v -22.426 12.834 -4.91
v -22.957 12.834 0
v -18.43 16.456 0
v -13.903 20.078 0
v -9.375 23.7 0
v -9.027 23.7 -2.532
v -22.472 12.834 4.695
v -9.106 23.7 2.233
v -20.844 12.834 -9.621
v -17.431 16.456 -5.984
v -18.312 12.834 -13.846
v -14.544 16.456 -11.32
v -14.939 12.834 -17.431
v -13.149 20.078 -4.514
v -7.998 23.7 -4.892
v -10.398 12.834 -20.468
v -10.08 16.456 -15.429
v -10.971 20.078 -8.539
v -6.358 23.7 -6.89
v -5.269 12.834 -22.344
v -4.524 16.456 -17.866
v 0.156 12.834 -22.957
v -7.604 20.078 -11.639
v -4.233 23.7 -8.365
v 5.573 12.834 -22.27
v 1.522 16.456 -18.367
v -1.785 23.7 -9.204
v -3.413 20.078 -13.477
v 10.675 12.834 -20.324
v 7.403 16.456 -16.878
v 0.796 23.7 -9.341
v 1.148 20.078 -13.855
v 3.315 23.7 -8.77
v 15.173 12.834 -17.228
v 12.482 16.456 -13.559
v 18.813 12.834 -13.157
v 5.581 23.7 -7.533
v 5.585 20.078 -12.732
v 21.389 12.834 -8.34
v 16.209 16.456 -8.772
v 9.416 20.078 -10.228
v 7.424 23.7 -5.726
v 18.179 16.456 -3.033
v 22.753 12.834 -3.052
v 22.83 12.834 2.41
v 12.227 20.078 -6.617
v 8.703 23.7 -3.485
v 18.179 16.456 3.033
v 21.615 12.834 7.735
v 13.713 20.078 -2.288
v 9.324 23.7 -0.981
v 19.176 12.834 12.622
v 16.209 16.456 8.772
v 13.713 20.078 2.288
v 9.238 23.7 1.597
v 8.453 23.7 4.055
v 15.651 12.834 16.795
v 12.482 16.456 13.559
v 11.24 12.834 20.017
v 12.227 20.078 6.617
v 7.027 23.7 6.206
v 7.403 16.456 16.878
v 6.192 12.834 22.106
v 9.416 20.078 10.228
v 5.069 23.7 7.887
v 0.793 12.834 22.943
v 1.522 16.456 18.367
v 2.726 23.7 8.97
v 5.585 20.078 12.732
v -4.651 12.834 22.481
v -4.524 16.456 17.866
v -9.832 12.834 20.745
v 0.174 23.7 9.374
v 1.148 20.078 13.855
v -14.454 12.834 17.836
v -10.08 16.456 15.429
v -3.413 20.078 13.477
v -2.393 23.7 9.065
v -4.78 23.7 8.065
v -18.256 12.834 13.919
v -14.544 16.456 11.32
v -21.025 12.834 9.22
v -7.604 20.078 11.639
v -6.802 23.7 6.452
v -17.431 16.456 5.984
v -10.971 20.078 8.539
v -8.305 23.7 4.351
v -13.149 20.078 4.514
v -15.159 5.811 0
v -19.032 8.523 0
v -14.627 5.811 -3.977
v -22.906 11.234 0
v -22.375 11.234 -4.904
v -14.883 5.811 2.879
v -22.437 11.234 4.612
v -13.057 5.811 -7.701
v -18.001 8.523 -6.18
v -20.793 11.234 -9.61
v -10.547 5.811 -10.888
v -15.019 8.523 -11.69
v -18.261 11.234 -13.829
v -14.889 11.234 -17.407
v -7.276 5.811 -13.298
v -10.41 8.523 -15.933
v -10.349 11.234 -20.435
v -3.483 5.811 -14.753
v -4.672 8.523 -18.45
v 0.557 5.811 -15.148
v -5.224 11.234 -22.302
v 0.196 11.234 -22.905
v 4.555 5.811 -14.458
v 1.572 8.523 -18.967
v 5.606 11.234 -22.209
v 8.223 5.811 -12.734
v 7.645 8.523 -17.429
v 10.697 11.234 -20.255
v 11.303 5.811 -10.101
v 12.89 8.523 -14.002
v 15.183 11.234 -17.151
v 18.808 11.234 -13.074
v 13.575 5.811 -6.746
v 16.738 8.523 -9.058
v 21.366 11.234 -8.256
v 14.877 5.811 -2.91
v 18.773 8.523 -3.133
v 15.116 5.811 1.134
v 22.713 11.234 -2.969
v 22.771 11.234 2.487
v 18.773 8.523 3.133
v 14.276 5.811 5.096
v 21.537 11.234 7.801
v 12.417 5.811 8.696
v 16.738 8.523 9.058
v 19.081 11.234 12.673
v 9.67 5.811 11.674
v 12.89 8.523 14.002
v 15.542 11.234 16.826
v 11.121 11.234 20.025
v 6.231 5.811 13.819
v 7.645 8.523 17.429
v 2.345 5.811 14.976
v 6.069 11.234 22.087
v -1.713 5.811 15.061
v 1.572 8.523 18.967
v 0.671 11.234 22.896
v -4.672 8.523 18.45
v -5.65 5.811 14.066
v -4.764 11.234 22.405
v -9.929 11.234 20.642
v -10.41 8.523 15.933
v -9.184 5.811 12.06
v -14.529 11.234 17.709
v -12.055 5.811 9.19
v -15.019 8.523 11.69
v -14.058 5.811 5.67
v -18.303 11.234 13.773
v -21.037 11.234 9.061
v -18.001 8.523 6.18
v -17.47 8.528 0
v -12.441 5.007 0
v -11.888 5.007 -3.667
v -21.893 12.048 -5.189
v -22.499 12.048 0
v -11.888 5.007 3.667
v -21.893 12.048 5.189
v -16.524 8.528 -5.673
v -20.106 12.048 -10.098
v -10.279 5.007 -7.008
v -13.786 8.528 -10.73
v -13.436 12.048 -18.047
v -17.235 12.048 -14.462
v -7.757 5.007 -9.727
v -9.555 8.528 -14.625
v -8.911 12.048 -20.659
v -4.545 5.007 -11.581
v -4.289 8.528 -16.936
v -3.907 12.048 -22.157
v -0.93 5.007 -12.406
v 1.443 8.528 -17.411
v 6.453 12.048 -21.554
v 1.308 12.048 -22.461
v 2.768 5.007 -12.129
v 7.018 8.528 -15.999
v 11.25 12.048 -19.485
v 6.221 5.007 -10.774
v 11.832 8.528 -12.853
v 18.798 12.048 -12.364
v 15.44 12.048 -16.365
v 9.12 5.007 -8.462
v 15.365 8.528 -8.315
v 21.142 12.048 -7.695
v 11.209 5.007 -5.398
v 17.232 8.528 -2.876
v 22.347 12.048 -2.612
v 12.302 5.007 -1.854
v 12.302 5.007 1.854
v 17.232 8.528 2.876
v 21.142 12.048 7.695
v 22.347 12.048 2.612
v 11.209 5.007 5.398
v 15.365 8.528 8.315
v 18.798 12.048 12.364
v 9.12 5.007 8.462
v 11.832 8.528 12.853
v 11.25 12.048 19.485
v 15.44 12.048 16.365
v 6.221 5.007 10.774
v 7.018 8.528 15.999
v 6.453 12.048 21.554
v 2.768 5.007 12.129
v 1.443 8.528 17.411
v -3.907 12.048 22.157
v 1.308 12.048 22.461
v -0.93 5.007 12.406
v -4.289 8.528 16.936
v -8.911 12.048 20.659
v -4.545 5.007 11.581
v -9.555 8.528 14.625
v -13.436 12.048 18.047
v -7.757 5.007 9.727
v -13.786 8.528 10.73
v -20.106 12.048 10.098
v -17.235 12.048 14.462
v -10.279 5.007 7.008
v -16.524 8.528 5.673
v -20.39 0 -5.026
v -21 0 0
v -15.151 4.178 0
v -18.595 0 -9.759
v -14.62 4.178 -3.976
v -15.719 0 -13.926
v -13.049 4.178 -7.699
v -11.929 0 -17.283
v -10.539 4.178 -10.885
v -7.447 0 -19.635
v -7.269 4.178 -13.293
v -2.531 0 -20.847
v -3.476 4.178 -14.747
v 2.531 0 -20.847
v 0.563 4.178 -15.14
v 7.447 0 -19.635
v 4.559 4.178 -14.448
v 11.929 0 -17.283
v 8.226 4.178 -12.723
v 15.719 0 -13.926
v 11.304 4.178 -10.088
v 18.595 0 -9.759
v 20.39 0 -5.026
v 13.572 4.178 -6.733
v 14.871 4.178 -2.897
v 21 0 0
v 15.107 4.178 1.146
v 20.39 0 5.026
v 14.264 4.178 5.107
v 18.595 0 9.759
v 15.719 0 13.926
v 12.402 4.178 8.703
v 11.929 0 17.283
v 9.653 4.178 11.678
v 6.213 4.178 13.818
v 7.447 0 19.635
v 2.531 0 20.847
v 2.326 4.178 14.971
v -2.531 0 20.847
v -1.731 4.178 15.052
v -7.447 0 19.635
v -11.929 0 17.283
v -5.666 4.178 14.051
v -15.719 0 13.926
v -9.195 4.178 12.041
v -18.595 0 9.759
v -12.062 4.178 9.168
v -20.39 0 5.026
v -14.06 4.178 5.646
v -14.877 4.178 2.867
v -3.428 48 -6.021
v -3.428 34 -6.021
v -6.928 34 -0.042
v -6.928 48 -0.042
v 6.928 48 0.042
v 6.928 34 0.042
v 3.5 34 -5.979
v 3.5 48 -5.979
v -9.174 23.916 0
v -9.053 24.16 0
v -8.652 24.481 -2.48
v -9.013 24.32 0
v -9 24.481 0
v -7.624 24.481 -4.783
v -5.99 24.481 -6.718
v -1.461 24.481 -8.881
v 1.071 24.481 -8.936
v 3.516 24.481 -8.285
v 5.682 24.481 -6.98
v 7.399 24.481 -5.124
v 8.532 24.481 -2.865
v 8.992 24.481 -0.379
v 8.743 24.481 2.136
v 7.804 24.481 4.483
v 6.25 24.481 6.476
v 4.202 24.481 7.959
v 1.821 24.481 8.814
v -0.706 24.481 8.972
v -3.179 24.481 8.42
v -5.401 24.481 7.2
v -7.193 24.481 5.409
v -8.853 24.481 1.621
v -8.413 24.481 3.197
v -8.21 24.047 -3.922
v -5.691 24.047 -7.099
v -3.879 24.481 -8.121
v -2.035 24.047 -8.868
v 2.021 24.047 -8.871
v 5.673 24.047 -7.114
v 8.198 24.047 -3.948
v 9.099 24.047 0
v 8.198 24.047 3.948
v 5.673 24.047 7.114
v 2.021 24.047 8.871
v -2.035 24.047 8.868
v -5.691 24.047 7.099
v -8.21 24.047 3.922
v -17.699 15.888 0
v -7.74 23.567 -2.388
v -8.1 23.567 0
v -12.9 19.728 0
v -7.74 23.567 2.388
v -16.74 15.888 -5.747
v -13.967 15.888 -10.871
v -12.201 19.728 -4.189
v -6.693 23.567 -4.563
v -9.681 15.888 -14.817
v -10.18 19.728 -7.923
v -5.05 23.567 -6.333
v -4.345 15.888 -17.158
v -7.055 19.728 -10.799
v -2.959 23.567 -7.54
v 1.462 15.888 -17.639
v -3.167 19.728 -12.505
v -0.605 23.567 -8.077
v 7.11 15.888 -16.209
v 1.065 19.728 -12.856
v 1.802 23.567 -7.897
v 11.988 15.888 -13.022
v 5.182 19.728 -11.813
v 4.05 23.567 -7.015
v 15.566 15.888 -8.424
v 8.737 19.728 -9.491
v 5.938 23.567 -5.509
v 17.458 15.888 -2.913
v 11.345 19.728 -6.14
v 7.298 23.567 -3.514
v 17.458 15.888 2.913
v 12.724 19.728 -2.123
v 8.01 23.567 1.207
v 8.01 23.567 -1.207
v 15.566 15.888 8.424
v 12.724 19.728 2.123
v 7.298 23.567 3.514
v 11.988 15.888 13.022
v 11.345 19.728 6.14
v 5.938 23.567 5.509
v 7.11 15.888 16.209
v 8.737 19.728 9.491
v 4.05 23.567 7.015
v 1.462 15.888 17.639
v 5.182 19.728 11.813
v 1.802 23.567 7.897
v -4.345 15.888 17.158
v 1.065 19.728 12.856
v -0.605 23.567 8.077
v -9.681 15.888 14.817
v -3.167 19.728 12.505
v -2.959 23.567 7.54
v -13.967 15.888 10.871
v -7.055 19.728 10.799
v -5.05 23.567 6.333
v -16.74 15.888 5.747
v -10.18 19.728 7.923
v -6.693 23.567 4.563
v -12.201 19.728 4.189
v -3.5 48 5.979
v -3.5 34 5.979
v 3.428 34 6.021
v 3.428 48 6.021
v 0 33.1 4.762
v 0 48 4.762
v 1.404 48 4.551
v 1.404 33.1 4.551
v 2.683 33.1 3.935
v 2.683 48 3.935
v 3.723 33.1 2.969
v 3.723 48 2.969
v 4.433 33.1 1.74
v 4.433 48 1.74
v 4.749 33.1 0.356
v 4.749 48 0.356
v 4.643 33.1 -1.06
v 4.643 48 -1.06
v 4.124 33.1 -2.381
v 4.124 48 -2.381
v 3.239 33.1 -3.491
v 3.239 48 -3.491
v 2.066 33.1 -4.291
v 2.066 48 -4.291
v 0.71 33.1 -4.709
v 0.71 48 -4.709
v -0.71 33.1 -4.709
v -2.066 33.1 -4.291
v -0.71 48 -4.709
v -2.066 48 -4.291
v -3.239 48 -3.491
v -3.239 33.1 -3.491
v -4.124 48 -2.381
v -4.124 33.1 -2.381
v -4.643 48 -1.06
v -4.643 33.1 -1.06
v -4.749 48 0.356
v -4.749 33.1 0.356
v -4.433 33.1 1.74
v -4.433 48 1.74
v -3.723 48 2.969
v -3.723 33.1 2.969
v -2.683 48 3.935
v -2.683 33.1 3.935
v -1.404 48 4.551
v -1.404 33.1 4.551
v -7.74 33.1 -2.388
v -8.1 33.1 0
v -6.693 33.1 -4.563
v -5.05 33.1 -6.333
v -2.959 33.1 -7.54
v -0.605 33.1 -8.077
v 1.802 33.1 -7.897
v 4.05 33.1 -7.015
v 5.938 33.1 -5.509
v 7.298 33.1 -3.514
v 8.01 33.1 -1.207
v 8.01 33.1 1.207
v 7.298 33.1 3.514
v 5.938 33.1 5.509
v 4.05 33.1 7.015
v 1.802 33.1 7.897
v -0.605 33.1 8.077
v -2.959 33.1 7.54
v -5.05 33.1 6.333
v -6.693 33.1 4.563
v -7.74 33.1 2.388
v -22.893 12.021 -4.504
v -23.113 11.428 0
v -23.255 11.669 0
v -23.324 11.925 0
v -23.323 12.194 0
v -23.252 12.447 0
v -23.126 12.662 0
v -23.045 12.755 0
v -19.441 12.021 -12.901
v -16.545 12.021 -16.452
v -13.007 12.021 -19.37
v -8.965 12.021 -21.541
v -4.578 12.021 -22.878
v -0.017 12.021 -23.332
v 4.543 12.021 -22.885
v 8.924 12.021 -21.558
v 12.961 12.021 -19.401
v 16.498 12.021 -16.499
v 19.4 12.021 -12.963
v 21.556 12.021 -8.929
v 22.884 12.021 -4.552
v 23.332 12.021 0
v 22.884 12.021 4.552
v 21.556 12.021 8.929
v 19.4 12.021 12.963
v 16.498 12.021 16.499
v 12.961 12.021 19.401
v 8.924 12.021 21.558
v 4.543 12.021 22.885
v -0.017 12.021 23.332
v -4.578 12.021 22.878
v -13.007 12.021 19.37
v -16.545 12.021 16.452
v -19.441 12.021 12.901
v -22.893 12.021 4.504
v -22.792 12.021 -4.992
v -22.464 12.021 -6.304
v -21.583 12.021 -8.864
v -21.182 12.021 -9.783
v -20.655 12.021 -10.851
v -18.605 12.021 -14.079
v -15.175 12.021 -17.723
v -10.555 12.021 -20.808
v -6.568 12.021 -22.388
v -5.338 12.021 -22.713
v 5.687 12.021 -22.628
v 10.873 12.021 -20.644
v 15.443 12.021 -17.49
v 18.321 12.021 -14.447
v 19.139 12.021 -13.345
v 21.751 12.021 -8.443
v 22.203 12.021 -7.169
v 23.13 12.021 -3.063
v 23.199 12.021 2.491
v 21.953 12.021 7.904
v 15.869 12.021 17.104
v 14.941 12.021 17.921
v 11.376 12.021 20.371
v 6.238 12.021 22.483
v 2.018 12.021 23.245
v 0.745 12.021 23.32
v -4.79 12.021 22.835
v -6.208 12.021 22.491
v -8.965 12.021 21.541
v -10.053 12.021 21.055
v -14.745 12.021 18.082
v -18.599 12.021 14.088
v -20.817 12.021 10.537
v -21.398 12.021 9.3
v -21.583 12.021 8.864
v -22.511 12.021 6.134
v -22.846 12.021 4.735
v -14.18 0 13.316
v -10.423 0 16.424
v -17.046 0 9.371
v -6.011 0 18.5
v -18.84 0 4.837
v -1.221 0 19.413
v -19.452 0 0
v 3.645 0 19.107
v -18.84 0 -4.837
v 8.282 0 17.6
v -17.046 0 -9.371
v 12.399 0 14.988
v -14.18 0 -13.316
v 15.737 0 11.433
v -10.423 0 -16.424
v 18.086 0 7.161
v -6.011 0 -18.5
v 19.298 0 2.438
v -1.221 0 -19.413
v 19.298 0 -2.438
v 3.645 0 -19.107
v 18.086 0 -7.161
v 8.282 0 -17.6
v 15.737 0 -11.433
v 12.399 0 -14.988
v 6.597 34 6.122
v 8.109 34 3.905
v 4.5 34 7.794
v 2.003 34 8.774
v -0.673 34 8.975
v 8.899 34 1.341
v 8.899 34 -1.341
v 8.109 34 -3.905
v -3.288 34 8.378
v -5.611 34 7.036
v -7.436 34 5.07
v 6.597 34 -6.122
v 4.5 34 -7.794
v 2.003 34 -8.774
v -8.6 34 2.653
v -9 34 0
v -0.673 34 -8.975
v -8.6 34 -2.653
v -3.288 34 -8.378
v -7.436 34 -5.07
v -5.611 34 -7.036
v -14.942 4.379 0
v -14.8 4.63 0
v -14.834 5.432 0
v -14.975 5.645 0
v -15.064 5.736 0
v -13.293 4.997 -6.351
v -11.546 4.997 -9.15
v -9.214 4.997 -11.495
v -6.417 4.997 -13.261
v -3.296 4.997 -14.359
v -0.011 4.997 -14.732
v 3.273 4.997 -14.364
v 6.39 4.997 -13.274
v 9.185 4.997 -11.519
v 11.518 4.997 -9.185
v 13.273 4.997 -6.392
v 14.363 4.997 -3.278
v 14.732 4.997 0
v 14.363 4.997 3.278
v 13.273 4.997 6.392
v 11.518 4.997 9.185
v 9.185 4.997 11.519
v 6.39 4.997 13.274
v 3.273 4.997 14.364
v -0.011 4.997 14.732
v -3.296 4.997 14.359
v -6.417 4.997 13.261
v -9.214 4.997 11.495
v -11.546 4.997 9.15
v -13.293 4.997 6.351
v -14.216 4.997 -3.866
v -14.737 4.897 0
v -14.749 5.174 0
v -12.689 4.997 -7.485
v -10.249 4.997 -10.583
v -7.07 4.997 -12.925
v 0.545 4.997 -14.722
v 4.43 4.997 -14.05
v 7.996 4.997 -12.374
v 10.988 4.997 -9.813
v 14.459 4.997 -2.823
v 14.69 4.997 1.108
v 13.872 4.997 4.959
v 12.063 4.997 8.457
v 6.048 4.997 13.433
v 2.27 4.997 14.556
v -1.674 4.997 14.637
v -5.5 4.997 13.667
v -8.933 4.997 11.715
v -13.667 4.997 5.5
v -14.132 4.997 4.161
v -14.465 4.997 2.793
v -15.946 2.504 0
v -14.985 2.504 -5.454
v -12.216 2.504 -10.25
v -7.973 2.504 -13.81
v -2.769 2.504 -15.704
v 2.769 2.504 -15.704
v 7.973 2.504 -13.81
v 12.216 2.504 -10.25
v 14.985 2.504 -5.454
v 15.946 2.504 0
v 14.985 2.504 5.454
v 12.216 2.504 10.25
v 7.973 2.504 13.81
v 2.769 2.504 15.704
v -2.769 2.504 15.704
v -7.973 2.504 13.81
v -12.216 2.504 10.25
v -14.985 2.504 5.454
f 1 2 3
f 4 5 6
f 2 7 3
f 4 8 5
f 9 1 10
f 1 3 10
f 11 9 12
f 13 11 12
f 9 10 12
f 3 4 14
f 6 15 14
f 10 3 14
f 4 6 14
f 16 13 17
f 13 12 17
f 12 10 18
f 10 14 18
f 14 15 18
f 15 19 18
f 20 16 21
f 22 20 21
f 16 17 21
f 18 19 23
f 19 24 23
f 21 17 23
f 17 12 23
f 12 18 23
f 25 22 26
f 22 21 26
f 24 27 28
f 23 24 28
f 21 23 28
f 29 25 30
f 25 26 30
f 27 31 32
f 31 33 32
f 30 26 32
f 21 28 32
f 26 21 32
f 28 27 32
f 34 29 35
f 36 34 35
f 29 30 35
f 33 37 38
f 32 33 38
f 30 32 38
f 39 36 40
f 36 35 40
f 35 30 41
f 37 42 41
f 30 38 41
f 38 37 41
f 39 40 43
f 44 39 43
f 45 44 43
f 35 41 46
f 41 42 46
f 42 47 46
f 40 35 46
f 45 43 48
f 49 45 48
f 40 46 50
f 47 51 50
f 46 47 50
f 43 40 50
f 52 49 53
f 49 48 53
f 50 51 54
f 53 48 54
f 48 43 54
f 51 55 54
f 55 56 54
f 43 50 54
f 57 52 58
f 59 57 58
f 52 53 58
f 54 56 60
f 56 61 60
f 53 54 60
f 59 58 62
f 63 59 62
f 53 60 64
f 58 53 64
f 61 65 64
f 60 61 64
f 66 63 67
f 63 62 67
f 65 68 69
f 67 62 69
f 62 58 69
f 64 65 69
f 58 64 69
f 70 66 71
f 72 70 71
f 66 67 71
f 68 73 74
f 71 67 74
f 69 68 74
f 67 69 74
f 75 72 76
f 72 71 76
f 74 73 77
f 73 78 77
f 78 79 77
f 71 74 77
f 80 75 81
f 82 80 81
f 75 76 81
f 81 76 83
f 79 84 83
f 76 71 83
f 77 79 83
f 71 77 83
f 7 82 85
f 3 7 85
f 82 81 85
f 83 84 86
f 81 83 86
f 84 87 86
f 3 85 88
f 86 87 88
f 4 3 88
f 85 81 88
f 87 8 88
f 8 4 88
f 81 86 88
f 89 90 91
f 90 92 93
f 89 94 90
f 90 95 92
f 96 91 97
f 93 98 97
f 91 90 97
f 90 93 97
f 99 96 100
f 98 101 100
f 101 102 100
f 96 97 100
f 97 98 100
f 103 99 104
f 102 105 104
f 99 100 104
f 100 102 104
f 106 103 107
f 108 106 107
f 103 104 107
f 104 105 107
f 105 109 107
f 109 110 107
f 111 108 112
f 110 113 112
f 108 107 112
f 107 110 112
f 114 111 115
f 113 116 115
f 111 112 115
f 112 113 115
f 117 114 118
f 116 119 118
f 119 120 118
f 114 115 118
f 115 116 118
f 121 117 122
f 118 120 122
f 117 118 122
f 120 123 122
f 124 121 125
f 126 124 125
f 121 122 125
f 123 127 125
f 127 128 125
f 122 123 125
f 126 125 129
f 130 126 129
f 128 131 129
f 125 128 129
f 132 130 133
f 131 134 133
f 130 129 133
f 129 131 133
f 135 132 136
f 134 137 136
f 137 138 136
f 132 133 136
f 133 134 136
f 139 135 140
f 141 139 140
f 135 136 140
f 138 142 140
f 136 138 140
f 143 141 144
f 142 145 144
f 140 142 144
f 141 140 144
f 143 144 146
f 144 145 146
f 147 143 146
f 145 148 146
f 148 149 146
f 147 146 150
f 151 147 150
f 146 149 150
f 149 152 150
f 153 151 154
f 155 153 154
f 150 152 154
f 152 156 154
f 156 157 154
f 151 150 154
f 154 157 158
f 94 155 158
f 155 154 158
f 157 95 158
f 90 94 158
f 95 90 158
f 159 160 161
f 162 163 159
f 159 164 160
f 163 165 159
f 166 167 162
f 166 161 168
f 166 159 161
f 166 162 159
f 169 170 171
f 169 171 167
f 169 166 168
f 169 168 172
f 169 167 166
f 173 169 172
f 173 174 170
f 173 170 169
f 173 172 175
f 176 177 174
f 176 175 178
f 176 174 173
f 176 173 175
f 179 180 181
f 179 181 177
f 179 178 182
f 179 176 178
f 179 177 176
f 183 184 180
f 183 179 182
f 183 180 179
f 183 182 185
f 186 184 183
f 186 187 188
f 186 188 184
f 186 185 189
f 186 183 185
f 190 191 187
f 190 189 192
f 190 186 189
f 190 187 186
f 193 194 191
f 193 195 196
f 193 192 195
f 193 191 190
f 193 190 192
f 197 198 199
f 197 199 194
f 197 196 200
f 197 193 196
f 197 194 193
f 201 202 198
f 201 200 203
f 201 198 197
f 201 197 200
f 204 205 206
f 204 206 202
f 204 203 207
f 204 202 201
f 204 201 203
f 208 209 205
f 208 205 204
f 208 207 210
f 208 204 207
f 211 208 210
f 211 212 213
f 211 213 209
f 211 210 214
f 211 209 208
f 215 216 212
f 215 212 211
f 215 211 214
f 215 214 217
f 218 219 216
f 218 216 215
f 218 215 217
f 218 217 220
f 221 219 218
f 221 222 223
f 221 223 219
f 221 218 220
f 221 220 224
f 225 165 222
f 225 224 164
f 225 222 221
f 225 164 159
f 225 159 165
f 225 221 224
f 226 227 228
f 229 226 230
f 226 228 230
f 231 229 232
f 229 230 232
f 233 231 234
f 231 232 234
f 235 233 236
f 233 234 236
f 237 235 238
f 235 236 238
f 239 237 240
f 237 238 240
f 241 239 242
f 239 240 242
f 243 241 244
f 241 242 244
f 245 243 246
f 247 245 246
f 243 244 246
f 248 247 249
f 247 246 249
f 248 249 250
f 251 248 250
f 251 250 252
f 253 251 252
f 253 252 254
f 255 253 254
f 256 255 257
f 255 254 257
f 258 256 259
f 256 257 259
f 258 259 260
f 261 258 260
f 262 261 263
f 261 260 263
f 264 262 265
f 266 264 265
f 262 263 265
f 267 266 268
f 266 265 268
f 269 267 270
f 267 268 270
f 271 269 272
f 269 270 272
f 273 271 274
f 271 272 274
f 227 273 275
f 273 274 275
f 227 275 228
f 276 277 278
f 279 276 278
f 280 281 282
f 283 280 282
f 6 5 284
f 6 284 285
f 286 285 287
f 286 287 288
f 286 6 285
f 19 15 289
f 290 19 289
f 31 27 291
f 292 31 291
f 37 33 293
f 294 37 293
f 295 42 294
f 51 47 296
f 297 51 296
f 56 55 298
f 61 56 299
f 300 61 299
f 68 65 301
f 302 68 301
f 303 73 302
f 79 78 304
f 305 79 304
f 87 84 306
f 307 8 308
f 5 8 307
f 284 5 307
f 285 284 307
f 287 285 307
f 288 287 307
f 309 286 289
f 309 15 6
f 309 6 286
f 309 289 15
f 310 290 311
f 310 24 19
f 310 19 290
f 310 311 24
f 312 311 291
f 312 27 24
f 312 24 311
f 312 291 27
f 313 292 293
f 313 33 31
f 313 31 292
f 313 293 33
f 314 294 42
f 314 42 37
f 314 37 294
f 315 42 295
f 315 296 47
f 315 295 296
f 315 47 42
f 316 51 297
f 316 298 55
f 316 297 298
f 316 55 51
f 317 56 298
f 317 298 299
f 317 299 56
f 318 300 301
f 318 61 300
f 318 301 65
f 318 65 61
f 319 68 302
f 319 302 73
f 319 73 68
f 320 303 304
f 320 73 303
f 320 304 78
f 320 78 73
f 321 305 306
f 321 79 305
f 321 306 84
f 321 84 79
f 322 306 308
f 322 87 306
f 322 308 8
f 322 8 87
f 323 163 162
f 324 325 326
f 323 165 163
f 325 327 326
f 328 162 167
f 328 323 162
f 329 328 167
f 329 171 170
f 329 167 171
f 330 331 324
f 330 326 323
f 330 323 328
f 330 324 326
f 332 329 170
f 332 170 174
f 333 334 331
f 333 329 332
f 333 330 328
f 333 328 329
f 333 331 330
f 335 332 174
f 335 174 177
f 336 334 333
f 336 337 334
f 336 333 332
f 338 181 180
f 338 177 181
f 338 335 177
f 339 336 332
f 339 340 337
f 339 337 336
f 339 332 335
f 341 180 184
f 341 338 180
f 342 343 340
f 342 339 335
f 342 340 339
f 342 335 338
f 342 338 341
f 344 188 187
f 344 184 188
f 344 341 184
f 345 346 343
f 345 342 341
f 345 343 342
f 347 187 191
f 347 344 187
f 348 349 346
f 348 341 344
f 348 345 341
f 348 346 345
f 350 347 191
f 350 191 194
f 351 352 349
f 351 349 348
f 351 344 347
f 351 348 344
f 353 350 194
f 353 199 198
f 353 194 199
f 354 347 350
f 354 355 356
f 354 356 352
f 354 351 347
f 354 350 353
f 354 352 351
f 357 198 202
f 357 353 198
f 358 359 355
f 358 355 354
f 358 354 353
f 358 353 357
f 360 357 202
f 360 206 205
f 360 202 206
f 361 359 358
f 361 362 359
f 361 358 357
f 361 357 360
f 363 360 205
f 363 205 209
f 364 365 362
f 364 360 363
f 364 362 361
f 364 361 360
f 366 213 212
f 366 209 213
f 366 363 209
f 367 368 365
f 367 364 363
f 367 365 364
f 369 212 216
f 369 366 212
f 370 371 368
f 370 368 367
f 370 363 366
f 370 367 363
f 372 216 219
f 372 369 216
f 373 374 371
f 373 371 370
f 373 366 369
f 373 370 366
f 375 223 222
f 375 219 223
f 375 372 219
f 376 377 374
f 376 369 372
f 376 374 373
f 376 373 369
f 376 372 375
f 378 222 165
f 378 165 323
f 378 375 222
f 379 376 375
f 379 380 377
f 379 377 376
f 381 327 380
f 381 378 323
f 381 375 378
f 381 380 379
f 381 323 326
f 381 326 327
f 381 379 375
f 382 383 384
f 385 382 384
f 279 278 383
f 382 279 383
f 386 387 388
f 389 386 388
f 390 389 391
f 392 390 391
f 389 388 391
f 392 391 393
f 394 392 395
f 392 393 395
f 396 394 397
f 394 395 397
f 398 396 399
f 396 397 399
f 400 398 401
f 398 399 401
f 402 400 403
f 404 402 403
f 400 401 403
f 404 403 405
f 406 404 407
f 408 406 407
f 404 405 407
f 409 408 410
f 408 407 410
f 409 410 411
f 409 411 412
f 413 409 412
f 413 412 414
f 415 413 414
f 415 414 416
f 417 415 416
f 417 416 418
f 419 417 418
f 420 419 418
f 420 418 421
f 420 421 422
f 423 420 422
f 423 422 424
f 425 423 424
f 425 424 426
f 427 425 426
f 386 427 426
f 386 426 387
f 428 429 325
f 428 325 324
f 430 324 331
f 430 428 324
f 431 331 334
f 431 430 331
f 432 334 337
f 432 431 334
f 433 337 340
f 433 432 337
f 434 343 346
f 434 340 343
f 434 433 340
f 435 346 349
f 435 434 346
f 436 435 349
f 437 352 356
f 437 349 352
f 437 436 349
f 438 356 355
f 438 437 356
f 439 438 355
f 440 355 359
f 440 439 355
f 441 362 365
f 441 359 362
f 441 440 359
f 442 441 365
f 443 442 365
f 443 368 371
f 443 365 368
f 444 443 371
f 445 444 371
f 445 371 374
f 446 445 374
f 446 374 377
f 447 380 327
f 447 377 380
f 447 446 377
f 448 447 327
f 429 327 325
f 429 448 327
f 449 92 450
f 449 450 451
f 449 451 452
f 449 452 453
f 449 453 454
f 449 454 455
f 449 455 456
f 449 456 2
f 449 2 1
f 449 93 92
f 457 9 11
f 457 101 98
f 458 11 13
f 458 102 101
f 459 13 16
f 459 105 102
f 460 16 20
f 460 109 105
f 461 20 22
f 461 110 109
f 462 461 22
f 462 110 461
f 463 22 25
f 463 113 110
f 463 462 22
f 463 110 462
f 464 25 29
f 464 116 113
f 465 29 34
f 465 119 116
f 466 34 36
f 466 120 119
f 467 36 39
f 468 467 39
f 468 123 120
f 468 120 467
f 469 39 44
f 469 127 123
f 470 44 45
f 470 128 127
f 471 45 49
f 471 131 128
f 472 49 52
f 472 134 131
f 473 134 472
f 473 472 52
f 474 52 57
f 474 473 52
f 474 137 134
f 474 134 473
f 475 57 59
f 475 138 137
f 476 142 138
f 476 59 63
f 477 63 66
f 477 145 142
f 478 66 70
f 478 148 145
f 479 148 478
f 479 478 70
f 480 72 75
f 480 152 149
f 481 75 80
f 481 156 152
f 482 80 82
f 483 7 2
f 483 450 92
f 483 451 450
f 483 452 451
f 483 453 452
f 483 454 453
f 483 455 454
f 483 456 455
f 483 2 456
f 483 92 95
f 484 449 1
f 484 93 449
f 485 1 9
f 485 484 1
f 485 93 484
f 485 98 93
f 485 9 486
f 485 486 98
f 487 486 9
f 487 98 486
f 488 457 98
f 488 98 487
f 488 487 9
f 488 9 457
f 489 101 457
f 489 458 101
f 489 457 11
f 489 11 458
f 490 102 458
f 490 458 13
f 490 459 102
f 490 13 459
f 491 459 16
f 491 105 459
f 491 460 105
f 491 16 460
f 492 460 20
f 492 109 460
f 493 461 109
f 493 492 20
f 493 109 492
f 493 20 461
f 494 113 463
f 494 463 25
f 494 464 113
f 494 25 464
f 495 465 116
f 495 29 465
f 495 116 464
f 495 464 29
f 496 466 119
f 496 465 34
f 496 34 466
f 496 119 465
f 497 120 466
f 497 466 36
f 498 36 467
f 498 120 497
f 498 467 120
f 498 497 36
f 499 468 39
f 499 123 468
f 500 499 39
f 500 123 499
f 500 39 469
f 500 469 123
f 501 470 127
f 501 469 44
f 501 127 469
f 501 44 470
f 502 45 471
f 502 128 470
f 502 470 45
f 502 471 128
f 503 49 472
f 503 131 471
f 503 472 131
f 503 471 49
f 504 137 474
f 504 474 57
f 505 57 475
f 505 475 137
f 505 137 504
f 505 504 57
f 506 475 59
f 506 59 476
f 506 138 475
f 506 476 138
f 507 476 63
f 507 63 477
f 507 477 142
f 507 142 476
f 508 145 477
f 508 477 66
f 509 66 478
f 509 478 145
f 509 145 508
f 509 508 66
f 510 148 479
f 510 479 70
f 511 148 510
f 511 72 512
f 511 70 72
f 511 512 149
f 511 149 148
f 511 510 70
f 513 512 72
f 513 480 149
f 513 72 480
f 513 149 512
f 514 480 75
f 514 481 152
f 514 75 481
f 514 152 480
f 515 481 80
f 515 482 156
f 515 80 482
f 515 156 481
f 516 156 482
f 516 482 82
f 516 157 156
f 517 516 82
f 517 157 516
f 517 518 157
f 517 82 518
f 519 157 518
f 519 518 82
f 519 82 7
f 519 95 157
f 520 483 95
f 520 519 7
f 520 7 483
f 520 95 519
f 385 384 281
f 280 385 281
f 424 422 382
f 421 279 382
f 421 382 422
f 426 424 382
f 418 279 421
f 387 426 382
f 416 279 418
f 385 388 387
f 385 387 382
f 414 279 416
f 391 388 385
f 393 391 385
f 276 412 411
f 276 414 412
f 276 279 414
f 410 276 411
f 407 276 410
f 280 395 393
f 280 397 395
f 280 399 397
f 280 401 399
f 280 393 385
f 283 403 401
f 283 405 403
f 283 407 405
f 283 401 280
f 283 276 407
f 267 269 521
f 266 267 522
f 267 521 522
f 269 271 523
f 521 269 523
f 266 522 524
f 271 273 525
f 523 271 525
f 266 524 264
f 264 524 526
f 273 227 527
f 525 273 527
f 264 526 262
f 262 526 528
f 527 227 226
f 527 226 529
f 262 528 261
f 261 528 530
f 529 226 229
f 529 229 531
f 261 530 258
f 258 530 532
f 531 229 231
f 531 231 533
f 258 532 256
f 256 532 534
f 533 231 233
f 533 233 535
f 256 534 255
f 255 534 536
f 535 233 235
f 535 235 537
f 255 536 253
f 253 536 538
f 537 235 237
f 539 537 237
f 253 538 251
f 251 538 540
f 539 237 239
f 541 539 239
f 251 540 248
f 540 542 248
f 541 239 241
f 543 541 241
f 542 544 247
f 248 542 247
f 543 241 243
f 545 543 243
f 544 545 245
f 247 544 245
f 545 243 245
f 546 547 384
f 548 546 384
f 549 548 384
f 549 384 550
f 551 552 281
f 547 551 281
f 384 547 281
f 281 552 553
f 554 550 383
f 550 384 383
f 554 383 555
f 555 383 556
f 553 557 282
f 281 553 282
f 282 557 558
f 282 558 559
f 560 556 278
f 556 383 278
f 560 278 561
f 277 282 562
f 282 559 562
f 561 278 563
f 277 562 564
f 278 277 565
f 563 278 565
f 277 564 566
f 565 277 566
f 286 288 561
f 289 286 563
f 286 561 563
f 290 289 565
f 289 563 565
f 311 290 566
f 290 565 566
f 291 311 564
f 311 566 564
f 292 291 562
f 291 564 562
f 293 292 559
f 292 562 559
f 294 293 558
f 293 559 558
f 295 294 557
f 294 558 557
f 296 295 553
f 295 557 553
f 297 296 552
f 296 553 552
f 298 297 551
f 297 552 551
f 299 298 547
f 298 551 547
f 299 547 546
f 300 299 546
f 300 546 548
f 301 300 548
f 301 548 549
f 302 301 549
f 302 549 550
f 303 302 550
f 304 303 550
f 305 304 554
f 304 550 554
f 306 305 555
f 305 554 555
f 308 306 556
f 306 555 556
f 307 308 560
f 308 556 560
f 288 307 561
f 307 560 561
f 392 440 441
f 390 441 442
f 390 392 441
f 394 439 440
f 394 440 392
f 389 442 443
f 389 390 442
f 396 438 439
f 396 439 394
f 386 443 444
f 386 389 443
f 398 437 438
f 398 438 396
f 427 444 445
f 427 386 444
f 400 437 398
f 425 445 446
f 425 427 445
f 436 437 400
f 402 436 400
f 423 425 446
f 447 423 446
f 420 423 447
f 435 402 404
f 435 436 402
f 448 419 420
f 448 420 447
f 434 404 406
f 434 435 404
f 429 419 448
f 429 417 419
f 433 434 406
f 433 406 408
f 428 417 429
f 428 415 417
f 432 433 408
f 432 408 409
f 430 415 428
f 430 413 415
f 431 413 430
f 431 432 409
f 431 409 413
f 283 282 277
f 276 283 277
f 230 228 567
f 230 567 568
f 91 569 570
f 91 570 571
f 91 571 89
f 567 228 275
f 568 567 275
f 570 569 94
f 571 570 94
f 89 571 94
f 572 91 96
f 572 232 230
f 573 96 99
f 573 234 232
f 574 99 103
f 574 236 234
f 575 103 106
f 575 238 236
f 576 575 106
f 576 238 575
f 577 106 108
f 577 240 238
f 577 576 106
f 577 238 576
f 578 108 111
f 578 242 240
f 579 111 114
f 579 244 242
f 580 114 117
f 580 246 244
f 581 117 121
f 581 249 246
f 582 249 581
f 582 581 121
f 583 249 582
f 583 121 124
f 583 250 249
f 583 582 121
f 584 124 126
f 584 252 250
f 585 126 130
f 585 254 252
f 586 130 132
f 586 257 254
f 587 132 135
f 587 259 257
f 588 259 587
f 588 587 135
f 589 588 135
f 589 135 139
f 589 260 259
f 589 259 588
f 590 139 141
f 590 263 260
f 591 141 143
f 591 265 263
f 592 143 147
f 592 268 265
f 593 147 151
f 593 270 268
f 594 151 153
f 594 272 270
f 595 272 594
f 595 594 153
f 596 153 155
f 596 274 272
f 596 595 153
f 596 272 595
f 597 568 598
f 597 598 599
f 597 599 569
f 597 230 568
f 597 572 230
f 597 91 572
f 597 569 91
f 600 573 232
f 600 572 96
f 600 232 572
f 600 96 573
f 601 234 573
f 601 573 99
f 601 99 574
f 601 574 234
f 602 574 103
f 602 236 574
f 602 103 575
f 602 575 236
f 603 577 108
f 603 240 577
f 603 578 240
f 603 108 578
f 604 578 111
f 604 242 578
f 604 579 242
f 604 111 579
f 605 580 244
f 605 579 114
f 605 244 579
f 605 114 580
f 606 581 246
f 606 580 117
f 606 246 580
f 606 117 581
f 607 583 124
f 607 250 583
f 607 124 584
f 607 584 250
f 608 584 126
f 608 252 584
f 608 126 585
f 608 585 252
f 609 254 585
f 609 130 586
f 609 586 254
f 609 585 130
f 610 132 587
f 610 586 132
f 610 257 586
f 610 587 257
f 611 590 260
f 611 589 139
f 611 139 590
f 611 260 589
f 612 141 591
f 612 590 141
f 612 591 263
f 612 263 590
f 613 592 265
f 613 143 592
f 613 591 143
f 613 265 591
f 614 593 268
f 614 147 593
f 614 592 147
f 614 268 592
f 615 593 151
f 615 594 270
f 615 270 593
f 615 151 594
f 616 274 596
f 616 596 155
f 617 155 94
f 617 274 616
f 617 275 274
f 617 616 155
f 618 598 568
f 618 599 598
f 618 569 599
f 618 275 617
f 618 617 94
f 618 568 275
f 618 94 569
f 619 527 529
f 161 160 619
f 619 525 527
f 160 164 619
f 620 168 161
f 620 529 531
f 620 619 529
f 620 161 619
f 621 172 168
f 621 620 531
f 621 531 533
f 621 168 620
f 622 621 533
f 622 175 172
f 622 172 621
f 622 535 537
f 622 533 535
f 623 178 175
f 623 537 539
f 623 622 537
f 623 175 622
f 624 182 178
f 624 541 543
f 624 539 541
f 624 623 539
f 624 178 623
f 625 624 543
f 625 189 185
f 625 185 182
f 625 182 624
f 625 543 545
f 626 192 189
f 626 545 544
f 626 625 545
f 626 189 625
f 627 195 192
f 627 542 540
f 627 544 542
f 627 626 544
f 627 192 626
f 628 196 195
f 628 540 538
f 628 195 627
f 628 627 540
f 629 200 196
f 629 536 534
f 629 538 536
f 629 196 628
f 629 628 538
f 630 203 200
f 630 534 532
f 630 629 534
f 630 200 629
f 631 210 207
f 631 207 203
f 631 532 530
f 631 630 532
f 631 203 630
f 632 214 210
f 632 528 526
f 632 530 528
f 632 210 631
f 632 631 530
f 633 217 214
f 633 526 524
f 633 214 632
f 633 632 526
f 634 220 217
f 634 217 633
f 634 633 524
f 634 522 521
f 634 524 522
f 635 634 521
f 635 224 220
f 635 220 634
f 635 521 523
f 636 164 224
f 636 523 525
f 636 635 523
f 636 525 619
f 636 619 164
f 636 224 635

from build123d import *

# Parameters (mm, degrees)
CASCA1_T                 = -0.9
FILETE1_R                = 1
RESSALTO_EXTRUS_O1_DEPTH = 14
ESBO_O3_R                = 4.7625
CORTE_EXTRUS_O1_DEPTH    = 59.247826304


with BuildPart() as part:
    # Esboço1 → Revolução1 (revolve)
    with BuildSketch(Plane.XY, mode=Mode.PRIVATE) as revolu_o1_sk:
        Polygon((0, 0), (21, 0), (14, 5), (24, 12), (9, 24), (9, 34), (0, 34), align=None)
    revolve(revolu_o1_sk.sketch.rotate(Axis((0, 34, 0), (0, -1, 0)), 180), axis=Axis((0, 34, 0), (0, -1, 0)))

    # Casca1
    casca1_openings = [part.faces().sort_by_distance(p)[0] for p in [
        (0, 0, 0),
    ]]
    offset(amount=CASCA1_T, openings=casca1_openings, kind=Kind.INTERSECTION)

    # Filete1
    filete1_edges = [part.edges().sort_by_distance(p)[0] for p in [
        (9, 24, 0),
        (24, 12, 0),
        (14, 5, 0),
    ]]
    fillet(filete1_edges, radius=FILETE1_R)

    # Esboço2 → Ressalto-extrusão1 (add)
    with BuildSketch(Plane(origin=(0, 34, 0), x_dir=(1, 0, 0), z_dir=(0, 1, 0))):
        Polygon((3.499984176, 5.979139634), (-3.428094728, 6.020645027), (-6.928078904, 0.041505392), (-3.499984176, -5.979139634), (3.428094728, -6.020645027), (6.928078904, -0.041505392), align=None)
    extrude(amount=RESSALTO_EXTRUS_O1_DEPTH)

    # Esboço3 → Corte-extrusão1 (cut, through all)
    with BuildSketch(Plane(origin=(0, 48, 0), x_dir=(1, 0, 0), z_dir=(0, 1, 0))):
        with Locations(Location((0, 0, 0), (0, 0, 270))):
            Circle(ESBO_O3_R)
    extrude(amount=-CORTE_EXTRUS_O1_DEPTH, mode=Mode.SUBTRACT)


solid = part.part
